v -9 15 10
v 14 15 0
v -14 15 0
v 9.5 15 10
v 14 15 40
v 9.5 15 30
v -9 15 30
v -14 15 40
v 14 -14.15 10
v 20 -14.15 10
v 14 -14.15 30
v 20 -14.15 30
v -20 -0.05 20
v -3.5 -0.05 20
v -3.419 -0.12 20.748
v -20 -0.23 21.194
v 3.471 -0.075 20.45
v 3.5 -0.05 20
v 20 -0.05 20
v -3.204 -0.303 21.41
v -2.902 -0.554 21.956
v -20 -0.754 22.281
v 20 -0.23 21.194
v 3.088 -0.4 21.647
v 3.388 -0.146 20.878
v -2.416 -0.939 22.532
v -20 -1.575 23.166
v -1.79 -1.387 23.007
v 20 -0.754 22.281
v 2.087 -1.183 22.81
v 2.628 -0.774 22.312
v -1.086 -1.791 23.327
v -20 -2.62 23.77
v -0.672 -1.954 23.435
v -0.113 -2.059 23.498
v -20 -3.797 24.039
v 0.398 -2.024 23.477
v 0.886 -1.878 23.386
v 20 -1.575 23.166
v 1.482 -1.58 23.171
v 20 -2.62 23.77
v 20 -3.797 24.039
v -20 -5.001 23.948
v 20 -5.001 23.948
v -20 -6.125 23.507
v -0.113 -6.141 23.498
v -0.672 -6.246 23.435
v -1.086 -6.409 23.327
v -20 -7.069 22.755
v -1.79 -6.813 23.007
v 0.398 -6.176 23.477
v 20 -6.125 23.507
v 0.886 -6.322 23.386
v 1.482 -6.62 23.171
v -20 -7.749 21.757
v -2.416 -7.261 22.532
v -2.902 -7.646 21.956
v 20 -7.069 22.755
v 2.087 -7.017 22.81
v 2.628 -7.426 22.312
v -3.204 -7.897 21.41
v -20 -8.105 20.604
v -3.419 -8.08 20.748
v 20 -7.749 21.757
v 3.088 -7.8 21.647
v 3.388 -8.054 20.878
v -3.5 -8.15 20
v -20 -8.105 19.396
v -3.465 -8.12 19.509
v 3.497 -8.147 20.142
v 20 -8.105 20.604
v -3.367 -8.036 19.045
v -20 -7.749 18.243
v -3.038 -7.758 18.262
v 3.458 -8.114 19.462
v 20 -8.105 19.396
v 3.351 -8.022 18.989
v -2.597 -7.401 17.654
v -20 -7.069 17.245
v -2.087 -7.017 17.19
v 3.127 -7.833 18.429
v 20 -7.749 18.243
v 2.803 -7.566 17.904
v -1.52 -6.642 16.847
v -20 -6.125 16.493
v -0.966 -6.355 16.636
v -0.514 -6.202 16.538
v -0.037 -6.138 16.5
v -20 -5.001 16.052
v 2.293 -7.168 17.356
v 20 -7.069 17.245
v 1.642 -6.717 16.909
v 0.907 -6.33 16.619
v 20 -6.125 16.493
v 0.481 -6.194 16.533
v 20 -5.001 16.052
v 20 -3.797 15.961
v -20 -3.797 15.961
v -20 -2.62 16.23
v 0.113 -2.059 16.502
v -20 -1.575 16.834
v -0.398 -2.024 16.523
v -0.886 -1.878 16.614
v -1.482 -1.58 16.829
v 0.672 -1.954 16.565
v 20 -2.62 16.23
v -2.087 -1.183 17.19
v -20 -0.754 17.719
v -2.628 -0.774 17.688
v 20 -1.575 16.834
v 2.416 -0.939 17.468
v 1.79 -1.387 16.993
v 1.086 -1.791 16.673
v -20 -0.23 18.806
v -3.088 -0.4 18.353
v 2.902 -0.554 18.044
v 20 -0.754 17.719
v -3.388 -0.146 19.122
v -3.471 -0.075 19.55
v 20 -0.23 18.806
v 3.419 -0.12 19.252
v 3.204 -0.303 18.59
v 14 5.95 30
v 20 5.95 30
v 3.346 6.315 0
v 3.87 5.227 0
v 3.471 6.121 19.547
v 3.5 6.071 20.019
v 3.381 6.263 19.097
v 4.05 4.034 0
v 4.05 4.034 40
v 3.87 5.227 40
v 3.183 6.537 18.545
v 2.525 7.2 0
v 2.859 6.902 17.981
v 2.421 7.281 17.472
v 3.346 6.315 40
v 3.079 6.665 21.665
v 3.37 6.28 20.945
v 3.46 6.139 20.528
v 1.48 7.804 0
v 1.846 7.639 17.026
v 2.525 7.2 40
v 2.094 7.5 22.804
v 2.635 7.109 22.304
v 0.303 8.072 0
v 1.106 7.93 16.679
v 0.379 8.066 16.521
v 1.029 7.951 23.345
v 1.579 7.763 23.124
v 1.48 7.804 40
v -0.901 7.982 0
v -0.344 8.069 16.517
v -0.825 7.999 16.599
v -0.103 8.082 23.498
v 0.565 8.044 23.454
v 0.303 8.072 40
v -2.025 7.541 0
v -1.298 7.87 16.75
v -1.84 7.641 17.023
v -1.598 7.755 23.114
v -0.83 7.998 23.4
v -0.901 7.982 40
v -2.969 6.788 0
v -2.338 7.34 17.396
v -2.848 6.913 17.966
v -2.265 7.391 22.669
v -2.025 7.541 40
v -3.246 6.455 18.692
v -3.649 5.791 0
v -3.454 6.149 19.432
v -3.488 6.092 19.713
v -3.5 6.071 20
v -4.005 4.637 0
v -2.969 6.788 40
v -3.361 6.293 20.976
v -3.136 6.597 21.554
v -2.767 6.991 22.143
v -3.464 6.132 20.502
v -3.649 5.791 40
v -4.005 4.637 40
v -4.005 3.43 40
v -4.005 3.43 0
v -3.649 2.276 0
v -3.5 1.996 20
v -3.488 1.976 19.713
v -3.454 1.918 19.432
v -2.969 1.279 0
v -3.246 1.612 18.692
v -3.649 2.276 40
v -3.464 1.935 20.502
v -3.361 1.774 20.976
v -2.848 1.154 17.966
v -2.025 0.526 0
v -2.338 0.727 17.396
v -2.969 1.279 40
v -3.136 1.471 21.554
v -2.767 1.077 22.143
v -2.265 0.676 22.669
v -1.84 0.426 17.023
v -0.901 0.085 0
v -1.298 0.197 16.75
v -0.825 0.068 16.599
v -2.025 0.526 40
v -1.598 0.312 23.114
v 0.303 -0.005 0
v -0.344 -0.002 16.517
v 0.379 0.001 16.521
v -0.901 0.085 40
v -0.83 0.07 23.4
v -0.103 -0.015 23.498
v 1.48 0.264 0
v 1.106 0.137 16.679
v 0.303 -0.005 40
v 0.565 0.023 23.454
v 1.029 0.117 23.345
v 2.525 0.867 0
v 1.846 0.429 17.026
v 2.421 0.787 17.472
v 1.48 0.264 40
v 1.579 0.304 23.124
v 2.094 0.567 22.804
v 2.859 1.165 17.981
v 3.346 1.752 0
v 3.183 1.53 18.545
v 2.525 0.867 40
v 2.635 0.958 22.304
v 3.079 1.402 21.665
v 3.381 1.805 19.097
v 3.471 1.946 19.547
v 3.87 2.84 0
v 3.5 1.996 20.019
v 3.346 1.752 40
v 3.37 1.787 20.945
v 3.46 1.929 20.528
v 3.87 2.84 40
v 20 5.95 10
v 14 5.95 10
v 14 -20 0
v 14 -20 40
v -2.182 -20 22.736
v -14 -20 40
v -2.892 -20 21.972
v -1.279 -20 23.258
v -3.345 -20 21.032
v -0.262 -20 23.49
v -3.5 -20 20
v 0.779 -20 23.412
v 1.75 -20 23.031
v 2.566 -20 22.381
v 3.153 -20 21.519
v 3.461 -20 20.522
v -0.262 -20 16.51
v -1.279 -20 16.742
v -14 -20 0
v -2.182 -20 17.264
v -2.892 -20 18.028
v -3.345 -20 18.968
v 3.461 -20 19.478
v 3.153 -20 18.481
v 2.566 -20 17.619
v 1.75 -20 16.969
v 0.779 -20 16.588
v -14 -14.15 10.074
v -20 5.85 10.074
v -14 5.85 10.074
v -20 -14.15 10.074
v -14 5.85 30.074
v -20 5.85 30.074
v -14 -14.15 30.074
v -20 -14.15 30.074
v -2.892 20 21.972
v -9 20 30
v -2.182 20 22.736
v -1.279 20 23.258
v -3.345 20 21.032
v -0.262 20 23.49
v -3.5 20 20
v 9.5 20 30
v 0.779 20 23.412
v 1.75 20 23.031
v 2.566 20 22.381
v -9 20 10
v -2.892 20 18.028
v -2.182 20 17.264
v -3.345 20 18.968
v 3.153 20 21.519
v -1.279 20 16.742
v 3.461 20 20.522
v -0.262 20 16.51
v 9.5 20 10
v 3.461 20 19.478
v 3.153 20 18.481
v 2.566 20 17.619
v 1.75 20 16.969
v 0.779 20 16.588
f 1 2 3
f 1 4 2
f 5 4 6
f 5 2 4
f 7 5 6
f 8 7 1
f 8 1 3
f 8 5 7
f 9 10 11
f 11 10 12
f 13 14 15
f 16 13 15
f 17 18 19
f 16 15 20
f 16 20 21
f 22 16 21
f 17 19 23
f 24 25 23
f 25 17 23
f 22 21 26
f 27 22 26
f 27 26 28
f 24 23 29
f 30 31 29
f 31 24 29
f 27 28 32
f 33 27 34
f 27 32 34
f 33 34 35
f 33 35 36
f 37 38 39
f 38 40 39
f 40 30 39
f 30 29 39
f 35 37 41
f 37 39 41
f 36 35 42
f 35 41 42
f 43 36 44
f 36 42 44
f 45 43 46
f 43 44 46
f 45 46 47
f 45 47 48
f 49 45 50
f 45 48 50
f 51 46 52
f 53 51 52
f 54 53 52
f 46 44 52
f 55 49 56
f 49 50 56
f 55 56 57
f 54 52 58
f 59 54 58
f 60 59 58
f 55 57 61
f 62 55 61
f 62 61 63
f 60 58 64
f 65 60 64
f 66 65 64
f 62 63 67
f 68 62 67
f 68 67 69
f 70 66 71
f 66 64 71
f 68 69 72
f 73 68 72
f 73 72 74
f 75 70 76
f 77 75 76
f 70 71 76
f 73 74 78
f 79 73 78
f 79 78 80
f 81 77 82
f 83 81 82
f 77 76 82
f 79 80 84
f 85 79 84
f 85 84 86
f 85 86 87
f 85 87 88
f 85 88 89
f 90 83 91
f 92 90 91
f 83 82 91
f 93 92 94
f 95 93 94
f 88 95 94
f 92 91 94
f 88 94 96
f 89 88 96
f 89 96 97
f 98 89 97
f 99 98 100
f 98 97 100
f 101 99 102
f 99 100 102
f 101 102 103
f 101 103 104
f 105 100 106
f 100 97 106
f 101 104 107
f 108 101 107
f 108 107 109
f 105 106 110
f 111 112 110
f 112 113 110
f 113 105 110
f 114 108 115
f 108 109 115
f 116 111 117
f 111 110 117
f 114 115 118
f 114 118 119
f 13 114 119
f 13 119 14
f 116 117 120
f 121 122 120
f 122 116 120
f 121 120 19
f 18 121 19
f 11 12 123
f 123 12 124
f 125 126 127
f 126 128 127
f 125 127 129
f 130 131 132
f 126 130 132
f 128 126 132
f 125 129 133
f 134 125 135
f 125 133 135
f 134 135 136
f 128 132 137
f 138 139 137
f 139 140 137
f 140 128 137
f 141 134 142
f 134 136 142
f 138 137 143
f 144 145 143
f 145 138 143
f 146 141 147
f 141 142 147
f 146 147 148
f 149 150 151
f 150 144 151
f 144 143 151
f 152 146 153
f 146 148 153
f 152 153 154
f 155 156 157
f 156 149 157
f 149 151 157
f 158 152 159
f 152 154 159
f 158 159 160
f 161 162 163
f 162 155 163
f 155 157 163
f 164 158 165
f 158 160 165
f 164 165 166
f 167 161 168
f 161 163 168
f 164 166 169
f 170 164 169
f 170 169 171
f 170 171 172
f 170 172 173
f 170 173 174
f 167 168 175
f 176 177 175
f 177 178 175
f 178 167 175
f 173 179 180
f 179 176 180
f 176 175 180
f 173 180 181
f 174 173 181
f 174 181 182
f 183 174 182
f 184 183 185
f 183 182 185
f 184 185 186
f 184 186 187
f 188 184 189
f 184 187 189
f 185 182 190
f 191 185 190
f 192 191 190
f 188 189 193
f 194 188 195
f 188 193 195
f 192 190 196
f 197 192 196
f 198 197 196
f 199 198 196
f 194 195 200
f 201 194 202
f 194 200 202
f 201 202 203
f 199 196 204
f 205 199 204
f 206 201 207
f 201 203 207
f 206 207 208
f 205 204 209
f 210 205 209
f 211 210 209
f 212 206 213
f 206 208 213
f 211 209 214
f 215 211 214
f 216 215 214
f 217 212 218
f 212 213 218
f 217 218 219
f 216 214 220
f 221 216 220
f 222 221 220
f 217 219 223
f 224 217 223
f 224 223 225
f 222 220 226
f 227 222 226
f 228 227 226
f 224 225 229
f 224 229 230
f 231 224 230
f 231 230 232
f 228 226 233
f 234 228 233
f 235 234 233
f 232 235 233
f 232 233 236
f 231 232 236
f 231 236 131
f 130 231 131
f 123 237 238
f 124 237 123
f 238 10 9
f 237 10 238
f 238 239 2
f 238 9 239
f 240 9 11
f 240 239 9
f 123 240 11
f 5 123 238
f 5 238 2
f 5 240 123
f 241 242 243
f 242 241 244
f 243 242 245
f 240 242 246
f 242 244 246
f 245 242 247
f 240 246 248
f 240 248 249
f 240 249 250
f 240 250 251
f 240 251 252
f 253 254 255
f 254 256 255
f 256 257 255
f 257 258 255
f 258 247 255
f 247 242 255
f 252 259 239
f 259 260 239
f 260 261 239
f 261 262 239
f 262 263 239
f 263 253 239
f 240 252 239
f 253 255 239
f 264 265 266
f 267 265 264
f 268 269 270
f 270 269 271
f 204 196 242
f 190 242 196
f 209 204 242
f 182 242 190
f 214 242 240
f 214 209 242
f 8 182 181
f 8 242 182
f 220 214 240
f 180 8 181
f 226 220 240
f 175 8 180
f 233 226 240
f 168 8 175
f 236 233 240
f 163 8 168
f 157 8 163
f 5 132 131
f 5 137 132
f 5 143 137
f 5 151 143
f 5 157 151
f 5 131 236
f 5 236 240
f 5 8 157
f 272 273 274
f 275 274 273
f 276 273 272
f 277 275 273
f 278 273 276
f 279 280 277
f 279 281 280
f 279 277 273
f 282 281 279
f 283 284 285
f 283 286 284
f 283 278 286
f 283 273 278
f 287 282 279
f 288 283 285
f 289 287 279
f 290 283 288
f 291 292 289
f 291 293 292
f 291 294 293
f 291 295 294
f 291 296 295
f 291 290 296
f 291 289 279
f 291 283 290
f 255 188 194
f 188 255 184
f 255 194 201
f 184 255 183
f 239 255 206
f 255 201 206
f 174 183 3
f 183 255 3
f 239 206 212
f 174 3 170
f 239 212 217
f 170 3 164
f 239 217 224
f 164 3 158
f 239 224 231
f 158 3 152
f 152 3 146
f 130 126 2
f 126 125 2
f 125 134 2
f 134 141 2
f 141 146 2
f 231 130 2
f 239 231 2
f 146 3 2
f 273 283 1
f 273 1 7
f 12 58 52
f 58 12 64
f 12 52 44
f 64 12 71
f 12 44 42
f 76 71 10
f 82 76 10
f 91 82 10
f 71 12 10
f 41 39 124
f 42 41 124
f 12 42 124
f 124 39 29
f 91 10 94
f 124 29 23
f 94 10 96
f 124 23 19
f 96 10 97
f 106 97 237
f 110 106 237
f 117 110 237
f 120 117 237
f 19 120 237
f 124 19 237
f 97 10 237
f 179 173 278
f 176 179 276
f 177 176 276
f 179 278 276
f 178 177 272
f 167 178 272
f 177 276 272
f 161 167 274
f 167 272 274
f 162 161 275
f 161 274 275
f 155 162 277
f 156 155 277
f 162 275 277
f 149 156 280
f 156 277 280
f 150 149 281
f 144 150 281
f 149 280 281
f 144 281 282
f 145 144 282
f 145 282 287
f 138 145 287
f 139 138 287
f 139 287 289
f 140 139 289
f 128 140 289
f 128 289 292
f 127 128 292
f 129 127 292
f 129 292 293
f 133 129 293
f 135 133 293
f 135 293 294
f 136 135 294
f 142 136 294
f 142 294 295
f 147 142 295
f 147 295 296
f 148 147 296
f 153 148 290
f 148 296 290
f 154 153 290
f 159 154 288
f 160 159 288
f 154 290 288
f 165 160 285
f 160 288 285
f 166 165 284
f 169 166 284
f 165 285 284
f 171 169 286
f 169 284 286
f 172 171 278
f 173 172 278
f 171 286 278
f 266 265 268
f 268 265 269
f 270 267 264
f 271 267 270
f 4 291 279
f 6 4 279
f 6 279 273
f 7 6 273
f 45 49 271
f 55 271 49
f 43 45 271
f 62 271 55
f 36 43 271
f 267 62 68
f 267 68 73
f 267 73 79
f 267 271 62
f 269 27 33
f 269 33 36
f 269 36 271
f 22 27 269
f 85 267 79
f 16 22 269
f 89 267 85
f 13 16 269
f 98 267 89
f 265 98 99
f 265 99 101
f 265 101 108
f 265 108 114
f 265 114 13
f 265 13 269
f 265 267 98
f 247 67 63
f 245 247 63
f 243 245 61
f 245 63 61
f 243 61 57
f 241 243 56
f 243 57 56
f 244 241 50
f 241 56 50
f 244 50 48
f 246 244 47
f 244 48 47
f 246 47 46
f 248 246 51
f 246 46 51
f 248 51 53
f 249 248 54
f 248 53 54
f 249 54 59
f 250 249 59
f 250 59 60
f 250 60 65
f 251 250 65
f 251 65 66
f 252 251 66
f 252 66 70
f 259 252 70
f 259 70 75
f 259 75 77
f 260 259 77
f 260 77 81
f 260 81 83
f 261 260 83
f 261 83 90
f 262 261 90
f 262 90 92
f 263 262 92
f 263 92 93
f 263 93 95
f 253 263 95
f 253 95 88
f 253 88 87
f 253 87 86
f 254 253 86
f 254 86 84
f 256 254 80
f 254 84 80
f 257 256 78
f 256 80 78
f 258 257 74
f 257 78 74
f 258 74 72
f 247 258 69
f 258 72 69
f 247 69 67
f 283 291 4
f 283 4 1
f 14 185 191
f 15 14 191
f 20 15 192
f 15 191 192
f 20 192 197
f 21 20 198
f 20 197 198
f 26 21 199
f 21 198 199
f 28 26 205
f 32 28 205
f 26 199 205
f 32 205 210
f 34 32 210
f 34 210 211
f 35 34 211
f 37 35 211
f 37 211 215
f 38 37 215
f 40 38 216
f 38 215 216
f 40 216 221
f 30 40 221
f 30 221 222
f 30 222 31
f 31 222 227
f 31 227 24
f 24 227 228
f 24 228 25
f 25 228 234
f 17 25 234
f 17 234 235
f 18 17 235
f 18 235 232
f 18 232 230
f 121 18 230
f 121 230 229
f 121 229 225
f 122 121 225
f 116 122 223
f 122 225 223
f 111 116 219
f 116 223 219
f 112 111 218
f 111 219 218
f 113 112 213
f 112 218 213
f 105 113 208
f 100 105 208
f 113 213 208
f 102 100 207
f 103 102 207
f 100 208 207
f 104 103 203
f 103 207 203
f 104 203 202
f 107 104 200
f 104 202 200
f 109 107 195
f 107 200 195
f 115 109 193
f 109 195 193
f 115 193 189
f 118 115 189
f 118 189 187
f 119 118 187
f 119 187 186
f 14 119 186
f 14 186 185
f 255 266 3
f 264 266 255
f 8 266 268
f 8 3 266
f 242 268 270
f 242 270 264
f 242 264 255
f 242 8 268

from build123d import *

# Parameters (mm, degrees)
F0_W      = 40
F0_H      = 40
F1_DEPTH  = 40
F2_R      = 4.05
F3_DEPTH  = 40
F4_R      = 4.05
F5_DEPTH  = 40
F6_R      = 3.5
F7_DEPTH  = 40
F8_W      = 40
F8_H      = 40
F8_W_2    = 20.1
F8_H_2    = 20
F9_DEPTH  = 6
F10_W     = 34
F10_H     = 40
F10_W_2   = 18.5
F10_H_2   = 20
F11_DEPTH = 5
F12_W     = 35
F12_H     = 40
F12_W_2   = 20
F12_H_2   = 20
F13_DEPTH = 6


with BuildPart() as f1:
    # F0 (on Top) → F1 (new body)
    with BuildSketch(Plane.XY):
        Rectangle(F0_W, F0_H)
    extrude(amount=F1_DEPTH)

    # F2 (on face) → F3 (cut)
    with BuildSketch(Plane.XY.offset(40)):
        with Locations((0, 4.0336288512)):
            Circle(F2_R)
    extrude(amount=-F3_DEPTH, mode=Mode.SUBTRACT)

    # F4 (on face) → F5 (cut)
    with BuildSketch(Plane.YZ.offset(20)):
        with Locations((-4.1, 20)):
            Circle(F4_R)
    extrude(amount=-F5_DEPTH, mode=Mode.SUBTRACT)

    # F6 (on face) → F7 (cut)
    with BuildSketch(Plane(origin=(0, 20, 0), x_dir=(-1, 0, 0), z_dir=(0, 1, 0))):
        with Locations((0, 20)):
            Circle(F6_R)
    extrude(amount=-F7_DEPTH, mode=Mode.SUBTRACT)

    # F8 (on face) → F9 (cut)
    with BuildSketch(Plane.YZ.offset(20)):
        with Locations((0, 20)):
            Rectangle(F8_W, F8_H)
        with Locations((-4.1, 20)):
            Rectangle(F8_W_2, F8_H_2, mode=Mode.SUBTRACT)
    extrude(amount=-F9_DEPTH, mode=Mode.SUBTRACT)

    # F10 (on face) → F11 (cut)
    with BuildSketch(Plane(origin=(0, 20, 0), x_dir=(-1, 0, 0), z_dir=(0, 1, 0))):
        with Locations((3, 20)):
            Rectangle(F10_W, F10_H)
        with Locations((-0.25, 20)):
            Rectangle(F10_W_2, F10_H_2, mode=Mode.SUBTRACT)
    extrude(amount=-F11_DEPTH, mode=Mode.SUBTRACT)

    # F12 (on face) → F13 (cut)
    with BuildSketch(Plane(origin=(-20, 0, 0), x_dir=(0, -1, 0), z_dir=(-1, 0, 0))):
        with Locations((2.5, 20)):
            Rectangle(F12_W, F12_H)
        with Locations((4.15, 20.0738927722)):
            Rectangle(F12_W_2, F12_H_2, mode=Mode.SUBTRACT)
    extrude(amount=-F13_DEPTH, mode=Mode.SUBTRACT)


solid = f1.part
